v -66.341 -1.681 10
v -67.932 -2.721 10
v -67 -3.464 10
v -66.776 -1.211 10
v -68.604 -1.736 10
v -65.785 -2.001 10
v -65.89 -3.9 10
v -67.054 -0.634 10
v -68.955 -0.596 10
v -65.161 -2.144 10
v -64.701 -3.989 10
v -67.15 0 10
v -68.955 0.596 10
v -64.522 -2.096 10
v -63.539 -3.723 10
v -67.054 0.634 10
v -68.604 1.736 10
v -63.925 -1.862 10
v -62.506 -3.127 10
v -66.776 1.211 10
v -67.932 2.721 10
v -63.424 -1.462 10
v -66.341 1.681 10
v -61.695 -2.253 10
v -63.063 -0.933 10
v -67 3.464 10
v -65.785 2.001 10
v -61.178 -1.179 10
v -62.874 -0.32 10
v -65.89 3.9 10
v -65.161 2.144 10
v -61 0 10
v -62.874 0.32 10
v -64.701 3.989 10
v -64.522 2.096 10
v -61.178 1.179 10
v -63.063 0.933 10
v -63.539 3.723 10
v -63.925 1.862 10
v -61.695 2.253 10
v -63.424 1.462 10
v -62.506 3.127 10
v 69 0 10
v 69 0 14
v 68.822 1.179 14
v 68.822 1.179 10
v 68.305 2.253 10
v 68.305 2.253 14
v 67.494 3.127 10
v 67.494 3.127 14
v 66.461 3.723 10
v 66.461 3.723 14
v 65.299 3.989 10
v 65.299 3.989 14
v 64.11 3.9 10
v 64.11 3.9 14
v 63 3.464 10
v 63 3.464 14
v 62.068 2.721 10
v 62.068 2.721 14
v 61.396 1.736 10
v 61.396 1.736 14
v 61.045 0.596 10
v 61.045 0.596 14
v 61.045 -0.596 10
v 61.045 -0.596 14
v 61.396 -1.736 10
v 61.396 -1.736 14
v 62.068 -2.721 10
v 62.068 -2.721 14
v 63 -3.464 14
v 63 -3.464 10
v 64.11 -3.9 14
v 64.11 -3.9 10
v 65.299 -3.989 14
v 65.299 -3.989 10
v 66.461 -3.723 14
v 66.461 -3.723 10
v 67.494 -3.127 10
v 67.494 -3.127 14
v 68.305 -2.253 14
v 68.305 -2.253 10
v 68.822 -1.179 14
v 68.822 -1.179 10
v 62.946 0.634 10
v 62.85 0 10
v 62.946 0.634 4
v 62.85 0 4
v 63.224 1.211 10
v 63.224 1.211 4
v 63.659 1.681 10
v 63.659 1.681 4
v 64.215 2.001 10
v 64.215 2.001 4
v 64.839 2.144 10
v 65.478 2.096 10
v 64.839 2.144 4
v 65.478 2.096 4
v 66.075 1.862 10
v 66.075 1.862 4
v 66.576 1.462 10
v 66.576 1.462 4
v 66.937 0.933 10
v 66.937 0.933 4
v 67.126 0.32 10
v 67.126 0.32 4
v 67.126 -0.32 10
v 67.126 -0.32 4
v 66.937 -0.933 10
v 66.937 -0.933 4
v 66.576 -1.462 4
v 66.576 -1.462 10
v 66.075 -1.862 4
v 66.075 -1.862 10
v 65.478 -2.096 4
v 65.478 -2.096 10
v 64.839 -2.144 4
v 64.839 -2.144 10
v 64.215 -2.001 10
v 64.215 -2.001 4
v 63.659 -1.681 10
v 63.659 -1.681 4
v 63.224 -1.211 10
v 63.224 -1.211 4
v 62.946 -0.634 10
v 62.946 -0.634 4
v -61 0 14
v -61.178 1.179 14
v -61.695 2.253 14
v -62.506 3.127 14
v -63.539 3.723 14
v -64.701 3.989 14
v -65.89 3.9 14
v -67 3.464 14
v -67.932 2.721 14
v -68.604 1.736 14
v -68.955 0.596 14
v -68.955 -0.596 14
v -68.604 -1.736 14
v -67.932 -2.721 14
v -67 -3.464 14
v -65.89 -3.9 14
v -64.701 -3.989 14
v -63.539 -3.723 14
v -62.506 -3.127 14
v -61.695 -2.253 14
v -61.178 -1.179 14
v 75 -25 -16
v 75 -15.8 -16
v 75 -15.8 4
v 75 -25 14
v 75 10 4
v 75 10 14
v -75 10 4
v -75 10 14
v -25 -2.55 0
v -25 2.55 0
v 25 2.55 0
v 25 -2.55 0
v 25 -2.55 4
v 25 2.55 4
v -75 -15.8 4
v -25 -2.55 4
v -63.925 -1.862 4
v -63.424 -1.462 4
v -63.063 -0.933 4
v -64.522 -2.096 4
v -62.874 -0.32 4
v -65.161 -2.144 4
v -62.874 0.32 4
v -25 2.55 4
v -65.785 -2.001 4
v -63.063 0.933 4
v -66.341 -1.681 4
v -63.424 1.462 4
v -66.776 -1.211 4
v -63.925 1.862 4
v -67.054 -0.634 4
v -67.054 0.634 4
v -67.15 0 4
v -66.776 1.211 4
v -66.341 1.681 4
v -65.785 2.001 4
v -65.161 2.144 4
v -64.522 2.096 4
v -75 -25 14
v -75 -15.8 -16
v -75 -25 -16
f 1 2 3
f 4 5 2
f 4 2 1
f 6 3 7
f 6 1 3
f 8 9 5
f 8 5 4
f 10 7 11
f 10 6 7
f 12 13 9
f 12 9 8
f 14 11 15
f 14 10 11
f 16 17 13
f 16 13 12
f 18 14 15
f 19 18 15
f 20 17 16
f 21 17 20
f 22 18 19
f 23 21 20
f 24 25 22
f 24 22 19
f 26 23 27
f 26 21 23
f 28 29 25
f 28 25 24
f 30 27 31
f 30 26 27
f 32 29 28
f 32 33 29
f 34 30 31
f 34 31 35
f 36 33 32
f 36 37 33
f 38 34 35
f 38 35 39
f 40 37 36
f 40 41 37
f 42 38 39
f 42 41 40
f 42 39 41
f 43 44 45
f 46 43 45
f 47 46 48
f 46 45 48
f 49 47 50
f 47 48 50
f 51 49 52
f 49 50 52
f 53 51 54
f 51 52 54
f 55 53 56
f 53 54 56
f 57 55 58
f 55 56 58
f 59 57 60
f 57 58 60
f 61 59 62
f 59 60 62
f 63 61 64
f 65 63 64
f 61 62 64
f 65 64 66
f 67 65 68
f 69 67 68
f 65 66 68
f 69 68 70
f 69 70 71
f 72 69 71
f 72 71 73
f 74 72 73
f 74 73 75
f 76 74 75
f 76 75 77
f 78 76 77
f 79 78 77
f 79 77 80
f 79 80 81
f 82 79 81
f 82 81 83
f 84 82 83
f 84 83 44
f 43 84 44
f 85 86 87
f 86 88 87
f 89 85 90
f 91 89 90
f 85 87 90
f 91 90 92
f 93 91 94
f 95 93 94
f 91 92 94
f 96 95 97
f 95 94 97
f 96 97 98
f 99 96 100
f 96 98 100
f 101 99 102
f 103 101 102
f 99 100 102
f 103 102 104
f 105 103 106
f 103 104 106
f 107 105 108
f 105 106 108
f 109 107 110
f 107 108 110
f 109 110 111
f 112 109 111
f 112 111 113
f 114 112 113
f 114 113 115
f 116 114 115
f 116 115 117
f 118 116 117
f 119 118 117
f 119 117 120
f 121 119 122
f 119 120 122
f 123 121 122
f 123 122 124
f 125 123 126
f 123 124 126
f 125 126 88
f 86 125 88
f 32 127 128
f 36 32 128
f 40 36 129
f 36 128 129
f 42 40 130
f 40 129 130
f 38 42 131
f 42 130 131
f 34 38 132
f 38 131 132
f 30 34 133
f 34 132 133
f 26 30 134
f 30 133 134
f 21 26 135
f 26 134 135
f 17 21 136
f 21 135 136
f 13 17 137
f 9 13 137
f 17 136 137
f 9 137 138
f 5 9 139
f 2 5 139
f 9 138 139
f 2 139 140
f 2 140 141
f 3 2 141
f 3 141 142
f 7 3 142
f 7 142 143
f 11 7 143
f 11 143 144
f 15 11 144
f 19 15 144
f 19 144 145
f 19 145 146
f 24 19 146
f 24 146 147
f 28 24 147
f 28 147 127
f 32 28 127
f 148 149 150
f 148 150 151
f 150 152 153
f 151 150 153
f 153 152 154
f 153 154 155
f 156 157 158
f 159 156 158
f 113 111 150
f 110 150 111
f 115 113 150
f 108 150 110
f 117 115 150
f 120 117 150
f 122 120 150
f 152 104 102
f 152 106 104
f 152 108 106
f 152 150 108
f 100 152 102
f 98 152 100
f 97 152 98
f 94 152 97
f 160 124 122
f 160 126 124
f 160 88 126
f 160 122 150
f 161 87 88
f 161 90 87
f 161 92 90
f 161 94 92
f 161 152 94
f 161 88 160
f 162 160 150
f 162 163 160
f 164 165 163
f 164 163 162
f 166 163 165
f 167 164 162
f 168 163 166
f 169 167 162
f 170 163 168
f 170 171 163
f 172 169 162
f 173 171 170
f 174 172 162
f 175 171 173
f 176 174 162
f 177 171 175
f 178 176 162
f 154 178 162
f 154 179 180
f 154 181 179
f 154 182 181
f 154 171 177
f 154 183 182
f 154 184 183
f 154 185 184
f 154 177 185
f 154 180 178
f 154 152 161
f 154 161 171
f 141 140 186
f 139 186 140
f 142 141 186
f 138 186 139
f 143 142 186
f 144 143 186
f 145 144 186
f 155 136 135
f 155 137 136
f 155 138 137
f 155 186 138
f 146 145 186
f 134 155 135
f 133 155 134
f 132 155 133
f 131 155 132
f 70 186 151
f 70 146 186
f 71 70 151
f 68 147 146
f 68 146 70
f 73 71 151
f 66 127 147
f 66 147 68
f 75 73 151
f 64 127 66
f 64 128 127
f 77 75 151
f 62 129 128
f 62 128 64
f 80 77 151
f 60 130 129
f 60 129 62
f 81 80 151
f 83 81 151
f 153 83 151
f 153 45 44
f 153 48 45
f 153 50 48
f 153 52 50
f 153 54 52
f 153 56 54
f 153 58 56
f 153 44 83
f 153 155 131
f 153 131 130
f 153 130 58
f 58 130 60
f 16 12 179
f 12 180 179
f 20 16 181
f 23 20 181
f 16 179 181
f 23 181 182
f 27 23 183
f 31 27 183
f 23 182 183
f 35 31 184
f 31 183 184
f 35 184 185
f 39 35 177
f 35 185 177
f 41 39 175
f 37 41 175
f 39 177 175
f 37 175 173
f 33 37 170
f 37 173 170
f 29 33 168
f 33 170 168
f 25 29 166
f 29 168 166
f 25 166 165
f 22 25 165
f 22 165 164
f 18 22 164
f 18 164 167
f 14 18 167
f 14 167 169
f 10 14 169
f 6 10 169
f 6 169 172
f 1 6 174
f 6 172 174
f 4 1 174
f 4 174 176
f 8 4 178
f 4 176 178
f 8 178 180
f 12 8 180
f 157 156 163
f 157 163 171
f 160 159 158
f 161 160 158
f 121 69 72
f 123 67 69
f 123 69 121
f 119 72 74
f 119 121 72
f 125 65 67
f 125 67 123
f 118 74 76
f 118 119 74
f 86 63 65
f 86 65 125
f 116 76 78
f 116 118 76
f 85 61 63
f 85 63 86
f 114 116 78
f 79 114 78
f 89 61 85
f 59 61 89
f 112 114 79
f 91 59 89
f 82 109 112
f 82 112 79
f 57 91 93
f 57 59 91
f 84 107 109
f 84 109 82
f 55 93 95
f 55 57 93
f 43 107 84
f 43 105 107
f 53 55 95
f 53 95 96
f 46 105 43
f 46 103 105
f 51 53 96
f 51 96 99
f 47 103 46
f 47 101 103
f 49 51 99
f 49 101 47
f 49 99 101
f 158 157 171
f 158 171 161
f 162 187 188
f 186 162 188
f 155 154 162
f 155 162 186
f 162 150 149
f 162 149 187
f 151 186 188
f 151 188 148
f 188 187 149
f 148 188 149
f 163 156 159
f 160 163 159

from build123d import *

# Parameters (mm, degrees)
SKETCH_1_W                   = 50
SKETCH_1_H                   = 5.1
EXTRUDE_1_DEPTH              = 4
SKETCH_3_W                   = 50
SKETCH_3_H                   = 25
EXTRUDE_2_DEPTH              = 10
SKETCH_4_W                   = 10
SKETCH_4_H                   = 25
EXTRUDE_3_DEPTH              = 50
SKETCH_5_W                   = 150
SKETCH_5_H                   = 30
EXTRUDE_4_DEPTH              = 10
CUT_EXTRUDE_START            = -20
SKETCH_6_W                   = 150
SKETCH_6_H                   = 0.8
CUT_EXTRUDE_1_DEPTH          = 20
HOLE_WIZARD_M4_1_D           = 4.3
HOLE_WIZARD_M4_1_CBORE_D     = 8
HOLE_WIZARD_M4_1_CBORE_DEPTH = 4


with BuildPart() as part:
    # 스케치1 → 보스-돌출1 (new body)
    with BuildSketch(Plane.XY):
        Rectangle(SKETCH_1_W, SKETCH_1_H)
    extrude(amount=EXTRUDE_1_DEPTH)

    # 스케치3 → 보스-돌출2 (add)
    with BuildSketch(Plane.XY.offset(4)):
        with Locations((0, -2.5)):
            Rectangle(SKETCH_3_W, SKETCH_3_H)
    extrude(amount=EXTRUDE_2_DEPTH)

    # 스케치4 → 보스-돌출3 (add)
    with BuildSketch(Plane.ZY.offset(25)):
        with Locations((9, -2.5)):
            Rectangle(SKETCH_4_W, SKETCH_4_H)
    extrude_3 = extrude(amount=EXTRUDE_3_DEPTH)

    # 대칭 복사1: 보스-돌출3 across plane
    add(extrude_3.mirror(Plane.ZY))

    # 스케치5 → 보스-돌출4 (add)
    with BuildSketch(Plane.XZ.offset(15)):
        with Locations((0, -1)):
            Rectangle(SKETCH_5_W, SKETCH_5_H)
    extrude(amount=EXTRUDE_4_DEPTH)

    # 스케치6 → 컷-돌출1 (cut)
    with BuildSketch(Plane(origin=(0, 0, -16), x_dir=(-1, 0, 0), z_dir=(0, 0, -1)).offset(CUT_EXTRUDE_START)):
        with Locations((0, -15.4)):
            Rectangle(SKETCH_6_W, SKETCH_6_H)
    extrude(amount=CUT_EXTRUDE_1_DEPTH, mode=Mode.SUBTRACT)

    # M4 소켓 머리 캡 나사용 카운터보어1 (through all)
    with Locations(Plane.XY.offset(14)):
        with Locations((-65, 0), (65, 0)):
            CounterBoreHole(HOLE_WIZARD_M4_1_D / 2, HOLE_WIZARD_M4_1_CBORE_D / 2, HOLE_WIZARD_M4_1_CBORE_DEPTH)


solid = part.part
